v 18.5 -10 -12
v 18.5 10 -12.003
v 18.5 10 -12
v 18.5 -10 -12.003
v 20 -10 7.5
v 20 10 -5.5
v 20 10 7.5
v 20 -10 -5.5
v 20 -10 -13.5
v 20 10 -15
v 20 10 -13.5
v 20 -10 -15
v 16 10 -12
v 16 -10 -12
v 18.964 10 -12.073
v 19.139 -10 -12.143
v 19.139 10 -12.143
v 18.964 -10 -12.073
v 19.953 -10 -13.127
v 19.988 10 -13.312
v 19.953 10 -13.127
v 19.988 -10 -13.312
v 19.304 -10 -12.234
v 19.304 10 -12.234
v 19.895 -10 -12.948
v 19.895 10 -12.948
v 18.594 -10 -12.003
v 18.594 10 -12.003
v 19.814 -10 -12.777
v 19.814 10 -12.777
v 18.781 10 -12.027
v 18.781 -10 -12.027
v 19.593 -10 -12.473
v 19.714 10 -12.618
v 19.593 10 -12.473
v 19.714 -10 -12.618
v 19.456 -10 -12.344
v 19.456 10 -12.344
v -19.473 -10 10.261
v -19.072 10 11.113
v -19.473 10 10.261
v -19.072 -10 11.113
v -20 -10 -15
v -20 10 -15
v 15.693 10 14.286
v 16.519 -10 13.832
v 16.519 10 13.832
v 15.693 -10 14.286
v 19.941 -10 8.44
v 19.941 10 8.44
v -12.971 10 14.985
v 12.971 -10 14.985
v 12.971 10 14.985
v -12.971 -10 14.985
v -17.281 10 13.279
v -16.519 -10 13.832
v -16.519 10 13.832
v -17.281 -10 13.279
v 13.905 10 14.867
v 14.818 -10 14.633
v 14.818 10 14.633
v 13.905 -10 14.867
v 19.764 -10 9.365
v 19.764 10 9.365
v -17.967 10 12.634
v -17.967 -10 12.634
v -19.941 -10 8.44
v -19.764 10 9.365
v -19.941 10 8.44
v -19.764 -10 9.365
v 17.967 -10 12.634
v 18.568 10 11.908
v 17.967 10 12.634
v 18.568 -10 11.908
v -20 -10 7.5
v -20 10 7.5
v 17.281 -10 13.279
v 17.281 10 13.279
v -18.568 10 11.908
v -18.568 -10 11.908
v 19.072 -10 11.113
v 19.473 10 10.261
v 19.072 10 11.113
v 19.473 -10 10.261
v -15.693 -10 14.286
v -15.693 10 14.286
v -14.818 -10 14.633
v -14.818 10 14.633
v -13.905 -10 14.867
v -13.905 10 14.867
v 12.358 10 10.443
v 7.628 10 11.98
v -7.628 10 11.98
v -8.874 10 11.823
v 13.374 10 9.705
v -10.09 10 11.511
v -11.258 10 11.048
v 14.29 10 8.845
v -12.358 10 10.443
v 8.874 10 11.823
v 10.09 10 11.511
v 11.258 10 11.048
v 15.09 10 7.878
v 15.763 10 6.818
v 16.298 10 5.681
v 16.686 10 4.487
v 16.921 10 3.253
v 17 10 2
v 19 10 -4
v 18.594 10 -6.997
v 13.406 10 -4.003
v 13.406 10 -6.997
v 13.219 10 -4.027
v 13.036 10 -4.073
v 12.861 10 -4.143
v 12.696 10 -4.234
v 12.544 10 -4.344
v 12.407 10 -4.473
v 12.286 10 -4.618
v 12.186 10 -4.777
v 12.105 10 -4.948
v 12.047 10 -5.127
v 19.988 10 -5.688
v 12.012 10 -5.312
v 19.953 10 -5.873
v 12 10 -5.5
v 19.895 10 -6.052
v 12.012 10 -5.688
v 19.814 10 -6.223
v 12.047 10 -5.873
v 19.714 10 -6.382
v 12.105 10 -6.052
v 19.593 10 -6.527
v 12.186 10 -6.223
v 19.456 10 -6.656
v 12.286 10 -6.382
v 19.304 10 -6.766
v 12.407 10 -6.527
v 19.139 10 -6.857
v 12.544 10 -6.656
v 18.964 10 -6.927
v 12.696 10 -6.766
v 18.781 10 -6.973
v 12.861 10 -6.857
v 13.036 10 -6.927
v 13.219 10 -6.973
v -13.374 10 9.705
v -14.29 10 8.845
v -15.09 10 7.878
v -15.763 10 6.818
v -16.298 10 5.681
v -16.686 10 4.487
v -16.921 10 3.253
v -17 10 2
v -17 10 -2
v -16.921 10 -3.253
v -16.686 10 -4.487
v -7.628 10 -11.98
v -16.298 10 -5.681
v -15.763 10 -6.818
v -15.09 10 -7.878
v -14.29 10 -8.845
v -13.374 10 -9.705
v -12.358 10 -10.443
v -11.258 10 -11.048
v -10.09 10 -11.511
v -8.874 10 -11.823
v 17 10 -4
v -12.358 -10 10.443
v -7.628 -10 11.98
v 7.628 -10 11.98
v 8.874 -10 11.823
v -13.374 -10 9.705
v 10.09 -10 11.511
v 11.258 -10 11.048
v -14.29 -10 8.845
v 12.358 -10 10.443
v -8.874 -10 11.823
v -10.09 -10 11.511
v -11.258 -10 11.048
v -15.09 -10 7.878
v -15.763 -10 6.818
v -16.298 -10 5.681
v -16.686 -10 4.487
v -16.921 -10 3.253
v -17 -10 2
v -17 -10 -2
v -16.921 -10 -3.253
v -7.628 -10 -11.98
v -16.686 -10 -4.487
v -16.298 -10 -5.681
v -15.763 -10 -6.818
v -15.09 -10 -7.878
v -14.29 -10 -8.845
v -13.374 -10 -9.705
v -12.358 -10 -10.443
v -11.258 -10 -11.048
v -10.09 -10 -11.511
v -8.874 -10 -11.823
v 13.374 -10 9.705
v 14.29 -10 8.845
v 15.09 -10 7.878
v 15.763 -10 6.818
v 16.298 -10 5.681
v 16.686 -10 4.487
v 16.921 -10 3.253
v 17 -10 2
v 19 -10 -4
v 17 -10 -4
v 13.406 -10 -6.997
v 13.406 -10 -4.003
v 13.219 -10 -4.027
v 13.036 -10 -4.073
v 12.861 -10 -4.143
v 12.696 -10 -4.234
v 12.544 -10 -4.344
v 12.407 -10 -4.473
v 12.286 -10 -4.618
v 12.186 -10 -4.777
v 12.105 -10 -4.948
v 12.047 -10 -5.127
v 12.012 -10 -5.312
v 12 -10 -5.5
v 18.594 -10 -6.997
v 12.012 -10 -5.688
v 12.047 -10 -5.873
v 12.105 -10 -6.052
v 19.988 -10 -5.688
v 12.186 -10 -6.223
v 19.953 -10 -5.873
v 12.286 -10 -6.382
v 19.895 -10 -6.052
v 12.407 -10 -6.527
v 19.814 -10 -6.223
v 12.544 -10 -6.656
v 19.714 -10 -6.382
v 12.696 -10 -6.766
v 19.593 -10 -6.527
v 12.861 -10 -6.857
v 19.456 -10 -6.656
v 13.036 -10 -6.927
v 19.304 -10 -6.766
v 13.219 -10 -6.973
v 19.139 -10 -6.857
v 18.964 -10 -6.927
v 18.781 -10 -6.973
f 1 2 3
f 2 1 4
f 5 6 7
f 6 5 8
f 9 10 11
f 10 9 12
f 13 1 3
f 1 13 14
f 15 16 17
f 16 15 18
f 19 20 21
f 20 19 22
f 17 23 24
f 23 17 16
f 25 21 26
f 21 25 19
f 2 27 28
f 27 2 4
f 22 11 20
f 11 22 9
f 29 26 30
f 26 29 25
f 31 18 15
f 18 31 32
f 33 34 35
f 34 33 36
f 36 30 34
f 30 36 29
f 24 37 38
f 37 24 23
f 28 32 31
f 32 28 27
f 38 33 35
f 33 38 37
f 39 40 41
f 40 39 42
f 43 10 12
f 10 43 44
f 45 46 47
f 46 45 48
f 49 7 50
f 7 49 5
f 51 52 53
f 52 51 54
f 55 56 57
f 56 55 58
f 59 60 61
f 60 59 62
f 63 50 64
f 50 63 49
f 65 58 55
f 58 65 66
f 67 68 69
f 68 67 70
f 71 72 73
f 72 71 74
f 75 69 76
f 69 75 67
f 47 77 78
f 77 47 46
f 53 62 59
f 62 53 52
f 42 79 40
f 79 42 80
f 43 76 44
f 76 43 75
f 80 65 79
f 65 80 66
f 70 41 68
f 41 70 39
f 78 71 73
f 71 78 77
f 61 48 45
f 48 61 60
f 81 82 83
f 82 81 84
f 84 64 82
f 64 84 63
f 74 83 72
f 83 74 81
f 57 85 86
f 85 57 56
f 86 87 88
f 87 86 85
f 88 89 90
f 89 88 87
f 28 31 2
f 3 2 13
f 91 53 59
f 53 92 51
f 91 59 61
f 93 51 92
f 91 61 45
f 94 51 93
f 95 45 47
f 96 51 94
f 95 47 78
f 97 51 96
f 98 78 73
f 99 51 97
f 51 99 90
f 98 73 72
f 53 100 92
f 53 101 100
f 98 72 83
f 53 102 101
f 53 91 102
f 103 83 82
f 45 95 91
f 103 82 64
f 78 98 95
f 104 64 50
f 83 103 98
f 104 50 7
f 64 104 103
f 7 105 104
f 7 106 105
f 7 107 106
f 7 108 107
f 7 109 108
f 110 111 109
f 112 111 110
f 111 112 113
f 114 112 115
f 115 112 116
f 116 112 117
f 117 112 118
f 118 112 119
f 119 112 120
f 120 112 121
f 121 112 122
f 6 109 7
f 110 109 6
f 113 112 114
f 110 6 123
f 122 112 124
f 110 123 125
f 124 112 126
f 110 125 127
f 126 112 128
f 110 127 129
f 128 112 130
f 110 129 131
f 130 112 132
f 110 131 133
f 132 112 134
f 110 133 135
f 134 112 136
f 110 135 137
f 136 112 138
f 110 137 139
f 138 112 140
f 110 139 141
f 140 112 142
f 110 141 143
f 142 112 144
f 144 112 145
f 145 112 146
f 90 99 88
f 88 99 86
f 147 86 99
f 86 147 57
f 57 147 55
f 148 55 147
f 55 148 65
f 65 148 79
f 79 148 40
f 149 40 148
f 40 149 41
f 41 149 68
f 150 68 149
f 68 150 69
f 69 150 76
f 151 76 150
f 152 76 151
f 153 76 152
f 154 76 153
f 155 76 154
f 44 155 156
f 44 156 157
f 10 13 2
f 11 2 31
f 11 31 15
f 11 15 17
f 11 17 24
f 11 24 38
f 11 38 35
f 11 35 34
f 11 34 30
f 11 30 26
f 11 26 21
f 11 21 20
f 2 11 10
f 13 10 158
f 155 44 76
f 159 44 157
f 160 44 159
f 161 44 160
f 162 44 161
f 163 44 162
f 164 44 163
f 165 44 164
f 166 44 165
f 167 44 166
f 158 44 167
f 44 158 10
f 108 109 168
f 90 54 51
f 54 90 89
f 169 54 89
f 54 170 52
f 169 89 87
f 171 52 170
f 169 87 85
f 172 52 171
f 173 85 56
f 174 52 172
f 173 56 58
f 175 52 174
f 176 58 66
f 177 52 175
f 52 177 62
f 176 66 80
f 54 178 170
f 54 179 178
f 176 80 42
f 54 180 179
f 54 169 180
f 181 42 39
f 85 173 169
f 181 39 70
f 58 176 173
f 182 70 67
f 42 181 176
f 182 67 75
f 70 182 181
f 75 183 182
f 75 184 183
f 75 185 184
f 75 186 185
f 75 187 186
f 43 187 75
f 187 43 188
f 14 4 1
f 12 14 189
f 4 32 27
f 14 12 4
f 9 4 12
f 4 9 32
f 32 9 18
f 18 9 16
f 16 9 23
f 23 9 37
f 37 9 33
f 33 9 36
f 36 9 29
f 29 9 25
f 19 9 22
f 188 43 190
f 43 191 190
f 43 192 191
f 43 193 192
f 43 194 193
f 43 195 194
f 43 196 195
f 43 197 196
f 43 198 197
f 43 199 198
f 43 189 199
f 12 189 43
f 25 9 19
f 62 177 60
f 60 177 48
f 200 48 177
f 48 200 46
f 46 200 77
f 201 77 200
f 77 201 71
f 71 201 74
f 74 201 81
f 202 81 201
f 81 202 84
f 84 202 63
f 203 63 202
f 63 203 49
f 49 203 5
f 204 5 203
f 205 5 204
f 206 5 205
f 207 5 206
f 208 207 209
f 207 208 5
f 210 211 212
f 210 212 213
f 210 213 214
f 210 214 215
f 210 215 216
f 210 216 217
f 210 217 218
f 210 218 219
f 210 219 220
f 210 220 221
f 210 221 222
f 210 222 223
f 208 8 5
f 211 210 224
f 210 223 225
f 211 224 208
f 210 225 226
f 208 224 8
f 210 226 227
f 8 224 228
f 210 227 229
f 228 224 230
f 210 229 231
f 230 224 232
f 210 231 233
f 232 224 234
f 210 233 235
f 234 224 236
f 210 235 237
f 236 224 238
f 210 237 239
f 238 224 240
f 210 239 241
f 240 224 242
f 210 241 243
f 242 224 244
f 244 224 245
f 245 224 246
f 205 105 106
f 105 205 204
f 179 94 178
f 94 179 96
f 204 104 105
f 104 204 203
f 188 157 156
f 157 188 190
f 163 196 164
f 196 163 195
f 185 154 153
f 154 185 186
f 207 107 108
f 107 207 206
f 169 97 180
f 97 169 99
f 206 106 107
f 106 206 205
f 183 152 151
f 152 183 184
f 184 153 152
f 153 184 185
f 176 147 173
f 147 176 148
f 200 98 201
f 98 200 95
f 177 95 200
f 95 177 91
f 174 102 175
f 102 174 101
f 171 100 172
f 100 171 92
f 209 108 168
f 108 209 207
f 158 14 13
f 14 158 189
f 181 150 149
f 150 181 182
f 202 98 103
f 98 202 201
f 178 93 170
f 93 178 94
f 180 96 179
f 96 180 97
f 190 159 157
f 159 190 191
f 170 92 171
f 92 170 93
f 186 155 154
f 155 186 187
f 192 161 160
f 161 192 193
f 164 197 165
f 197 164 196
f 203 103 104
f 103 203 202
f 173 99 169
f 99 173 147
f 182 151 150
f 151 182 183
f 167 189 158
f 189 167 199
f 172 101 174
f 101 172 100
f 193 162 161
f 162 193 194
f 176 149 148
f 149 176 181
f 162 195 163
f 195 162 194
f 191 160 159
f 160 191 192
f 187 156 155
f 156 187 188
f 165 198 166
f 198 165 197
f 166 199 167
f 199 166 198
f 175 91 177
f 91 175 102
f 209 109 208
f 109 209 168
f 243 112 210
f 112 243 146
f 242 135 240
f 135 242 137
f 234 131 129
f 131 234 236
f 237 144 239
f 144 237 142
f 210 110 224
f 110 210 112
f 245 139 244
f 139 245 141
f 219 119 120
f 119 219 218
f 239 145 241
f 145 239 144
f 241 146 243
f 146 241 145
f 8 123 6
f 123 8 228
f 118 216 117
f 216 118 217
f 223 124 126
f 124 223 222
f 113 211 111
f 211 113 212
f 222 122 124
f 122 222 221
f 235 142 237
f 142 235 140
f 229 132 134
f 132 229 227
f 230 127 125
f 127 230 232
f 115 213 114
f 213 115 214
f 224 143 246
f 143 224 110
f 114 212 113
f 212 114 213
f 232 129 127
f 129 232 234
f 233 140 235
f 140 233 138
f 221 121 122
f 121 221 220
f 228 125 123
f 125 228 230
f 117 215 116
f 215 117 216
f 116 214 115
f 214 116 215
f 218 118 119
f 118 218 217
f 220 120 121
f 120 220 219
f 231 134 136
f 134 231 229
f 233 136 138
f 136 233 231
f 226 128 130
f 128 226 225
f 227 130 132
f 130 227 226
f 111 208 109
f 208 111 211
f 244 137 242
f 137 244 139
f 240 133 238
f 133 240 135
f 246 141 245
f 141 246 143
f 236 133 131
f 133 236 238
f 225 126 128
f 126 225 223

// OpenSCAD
// file: lib/rounded.scad
$fn=50;

module rounded_rectangle(width, height, radius) {
    minkowski() {
        square([width - radius*2, height - radius*2], center=true);
        circle(radius);
    }
}

module rounded_rectangle_border(width, height, radius, wall_width) {
    difference() {
      rounded_rectangle(width, height, radius);
      rounded_rectangle(width - wall_width*2, height - wall_width*2, radius);
    }
}

module rounded_cube(width, depth, height, radius) {
    minkowski() {
        cube([width - radius*2, depth - radius*2, height - radius*2], center=true);
        sphere(radius);
    }
}

module half_rounded_cube(width, depth, height, radius) {
    intersection() {
        rounded_cube(width, depth, height*2, radius);

        translate([-width/2, -depth/2, 0])
        cube([width, depth, height]);
    }
}

module quarter_rounded_cube(width, depth, height, radius) {
    intersection() {
        rounded_cube(width, depth*2, height*2, radius);

        translate([-width/2, 0, 0])
        cube([width, depth, height]);
    }
}

module negative_edge(width, radius) {
    difference() {
        cube([width, radius, radius], center = true);

        translate([0, radius/2, radius/2])
        rotate([0,90,0])
        cylinder(h = width + 0.1, r = radius, center = true);
    }
}


module rounded_edge(width, depth, height, radius) {
    assert(radius <= height, "Radius must be less or equal to the height");
    union() {
        translate([0, radius, 0])
        cube([width, depth - radius, height]);

        cube([width, radius, height - radius]);

        translate([0, radius, (height - radius)])
        quarter_cylinder(height = width, radius = radius);
    }
}

module centered_rounded_edge(width, depth, height, radius) {
    translate([-width/2, -depth/2, -height/2])
    rounded_edge(width, depth, height, radius);
}

module quarter_cylinder(height, radius) {
    rotate([90, -90, 90])
    rotate_extrude(angle = 90)
    square([radius, height]);
}

//cube([10,20,30]);
//rounded_cube(30, 50, 12, 5);
//half_rounded_cube(30, 50, 6, 5);
//quarter_rounded_cube(30, 25, 6, 5);
//centered_rounded_edge(100, 30, 12, 11);
//half_cylinder(30, 5);
//negative_edge(40, 5);
// file: lib/rcube.scad
// From https://blog.prusa3d.com/parametric-design-in-openscad_8758/

// Round Cube
module rcube(size, radius) {
  if (len(radius) == undef) {
    // The same radius on all corners
    rcube(size, [ radius, radius, radius, radius ]);
  } else if (len(radius) == 2) {
    // Different radii on top and bottom
    rcube(size, [ radius[0], radius[0], radius[1], radius[1] ]);
  } else if (len(radius) == 4) {
    translate([ -size.x / 2, -size.y / 2, -size.z / 2 ])
        // Different radius on different corners
        hull() {
      // BL
      if (radius[0] == 0)
        cube([ 1, 1, size[2] ]);
      else
        translate([ radius[0], radius[0] ])
            cylinder(r = radius[0], h = size[2]);
      // BR
      if (radius[1] == 0)
        translate([ size[0] - 1, 0 ]) cube([ 1, 1, size[2] ]);
      else
        translate([ size[0] - radius[1], radius[1] ])
            cylinder(r = radius[1], h = size[2]);
      // TR
      if (radius[2] == 0)
        translate([ size[0] - 1, size[1] - 1 ]) cube([ 1, 1, size[2] ]);
      else
        translate([ size[0] - radius[2], size[1] - radius[2] ])
            cylinder(r = radius[2], h = size[2]);
      // TL
      if (radius[3] == 0)
        translate([ 0, size[1] - 1 ]) cube([ 1, 1, size[2] ]);
      else
        translate([ radius[3], size[1] - radius[3] ])
            cylinder(r = radius[3], h = size[2]);
    }
  } else {
    echo(
        "ERROR: Incorrect length of 'radius' parameter. Expecting integer or " +
        "vector with length 2 or 4.");
  }
}

// Rotated Round Cube
module rrcube(size, radius) {
  rotate([ 90, 0, 0 ]) { rcube([ size.x, size.z, size.y ], radius); }
}
// main file
$fn = 50;

use <lib/rcube.scad>
use <lib/rounded.scad>

module tall_hook(size, thickness, inner_radius, opening_height = 5, latch = 8) {
  inner_radius =
      is_undef(inner_radius) ? min(size.z / 3, size.x / 3) : inner_radius;
  outer_radius =
      is_undef(outer_radius) ? min(size.z / 4, size.x / 4) : outer_radius;

  union() {
    difference() {
      // External
      rrcube(size, [ 0, 0, outer_radius, outer_radius ]);

      // Internal
      translate([ 0, 0, 0 ]) {
        rrcube([ size.x - thickness * 2, size.y + 0.2, size.z - thickness * 2 ],
               [ inner_radius, 0, inner_radius, inner_radius ]);
      }

      translate([
        size.x / 2 - thickness / 2, 0,
        -size.z / 2 + opening_height / 2 + thickness + thickness / 2
      ]) {
        cube([ thickness + 0.2, size.y + 0.2, opening_height + thickness ],
             center = true);
      }

      translate([
        size.x / 2 - thickness / 4, 0,
        -size.z / 2 + thickness / 4 + thickness / 2
      ]) {
        rotate([ 0, -90, 0 ]) {
          rotate([ 0, 0, 90 ]) { negative_edge(size.y + 0.2, thickness / 2); }
        }
      }
    }

    translate([
      size.x / 2 - latch / 2, 0,
      -size.z / 2 - thickness / 2 + thickness + opening_height +
      thickness
    ]) {
      rrcube([ latch, size.y, thickness ],
             [ thickness / 2, thickness / 2, 0, thickness / 2 ]);
    }
  }
}

// Mark 1:
// tall_hook([ 40, 20, 40 ], thickness = 3, inner_radius = 15, outer_radius =
// 10);

// Mark 2:
tall_hook([ 40, 20, 30 ], thickness = 3);
